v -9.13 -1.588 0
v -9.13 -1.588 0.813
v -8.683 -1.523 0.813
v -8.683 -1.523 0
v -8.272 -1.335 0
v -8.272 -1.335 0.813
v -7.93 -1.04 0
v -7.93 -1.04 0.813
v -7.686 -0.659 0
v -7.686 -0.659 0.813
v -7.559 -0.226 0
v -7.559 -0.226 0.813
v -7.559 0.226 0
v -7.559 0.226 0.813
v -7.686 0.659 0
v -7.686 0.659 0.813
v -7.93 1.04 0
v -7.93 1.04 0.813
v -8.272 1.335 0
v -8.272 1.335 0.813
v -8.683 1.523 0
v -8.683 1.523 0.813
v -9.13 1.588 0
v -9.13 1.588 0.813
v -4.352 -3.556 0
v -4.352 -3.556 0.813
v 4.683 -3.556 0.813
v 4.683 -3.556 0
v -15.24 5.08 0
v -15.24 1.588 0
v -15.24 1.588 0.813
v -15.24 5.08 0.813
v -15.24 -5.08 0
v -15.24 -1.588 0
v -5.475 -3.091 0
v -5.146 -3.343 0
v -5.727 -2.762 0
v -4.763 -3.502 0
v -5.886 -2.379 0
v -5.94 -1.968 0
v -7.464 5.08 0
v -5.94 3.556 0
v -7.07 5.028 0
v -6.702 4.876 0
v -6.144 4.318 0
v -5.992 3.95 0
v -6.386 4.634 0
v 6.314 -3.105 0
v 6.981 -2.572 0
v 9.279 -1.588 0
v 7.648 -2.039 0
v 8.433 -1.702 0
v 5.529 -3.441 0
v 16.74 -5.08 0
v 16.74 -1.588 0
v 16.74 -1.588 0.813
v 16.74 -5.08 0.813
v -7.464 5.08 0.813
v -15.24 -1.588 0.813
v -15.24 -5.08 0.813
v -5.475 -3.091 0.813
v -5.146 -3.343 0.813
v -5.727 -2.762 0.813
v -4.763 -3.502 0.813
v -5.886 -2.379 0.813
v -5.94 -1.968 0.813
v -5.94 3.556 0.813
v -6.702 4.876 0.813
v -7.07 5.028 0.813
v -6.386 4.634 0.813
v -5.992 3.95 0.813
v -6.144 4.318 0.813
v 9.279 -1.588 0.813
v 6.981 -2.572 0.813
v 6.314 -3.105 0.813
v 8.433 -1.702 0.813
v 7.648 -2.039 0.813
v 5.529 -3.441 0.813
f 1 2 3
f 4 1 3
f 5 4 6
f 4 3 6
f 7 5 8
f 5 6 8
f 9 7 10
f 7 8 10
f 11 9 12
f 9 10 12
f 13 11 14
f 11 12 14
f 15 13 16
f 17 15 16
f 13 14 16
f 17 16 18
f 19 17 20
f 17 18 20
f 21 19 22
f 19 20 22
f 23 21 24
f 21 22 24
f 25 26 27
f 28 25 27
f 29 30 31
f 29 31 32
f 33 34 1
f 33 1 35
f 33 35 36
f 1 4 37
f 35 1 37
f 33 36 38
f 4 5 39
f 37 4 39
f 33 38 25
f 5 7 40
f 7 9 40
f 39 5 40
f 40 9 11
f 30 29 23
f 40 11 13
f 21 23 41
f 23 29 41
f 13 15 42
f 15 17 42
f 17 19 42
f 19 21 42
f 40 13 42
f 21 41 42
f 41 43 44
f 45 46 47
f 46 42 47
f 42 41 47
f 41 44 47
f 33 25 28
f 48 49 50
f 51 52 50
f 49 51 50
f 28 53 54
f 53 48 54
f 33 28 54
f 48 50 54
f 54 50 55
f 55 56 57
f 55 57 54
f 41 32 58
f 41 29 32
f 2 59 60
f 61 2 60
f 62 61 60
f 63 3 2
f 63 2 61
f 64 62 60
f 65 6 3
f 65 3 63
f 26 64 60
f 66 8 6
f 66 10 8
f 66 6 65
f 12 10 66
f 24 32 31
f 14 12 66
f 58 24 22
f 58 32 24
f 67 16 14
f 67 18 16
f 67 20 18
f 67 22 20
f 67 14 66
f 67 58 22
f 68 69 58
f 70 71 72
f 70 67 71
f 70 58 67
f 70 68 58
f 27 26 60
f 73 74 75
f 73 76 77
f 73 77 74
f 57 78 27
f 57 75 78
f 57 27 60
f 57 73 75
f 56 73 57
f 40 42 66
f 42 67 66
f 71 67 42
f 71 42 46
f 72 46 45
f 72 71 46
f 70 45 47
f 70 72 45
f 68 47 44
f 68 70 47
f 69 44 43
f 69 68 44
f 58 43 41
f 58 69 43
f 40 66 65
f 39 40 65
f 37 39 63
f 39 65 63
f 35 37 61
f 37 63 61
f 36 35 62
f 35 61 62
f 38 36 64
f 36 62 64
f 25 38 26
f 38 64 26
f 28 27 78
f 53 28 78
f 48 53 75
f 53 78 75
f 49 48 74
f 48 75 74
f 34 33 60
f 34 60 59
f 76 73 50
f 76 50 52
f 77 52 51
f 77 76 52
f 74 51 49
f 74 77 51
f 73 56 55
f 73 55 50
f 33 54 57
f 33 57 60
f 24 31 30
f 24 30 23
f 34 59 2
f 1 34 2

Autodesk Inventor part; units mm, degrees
ref_plane "YZ Plane" through (0, 0, 0) normal (1, 0, 0) x (0, 1, 0)
ref_plane "XZ Plane" through (0, 0, 0) normal (0, 1, 0) x (-1, 0, 0)
ref_plane "XY Plane" through (0, 0, 0) normal (0, 0, 1) x (1, 0, 0)
sketch "Sketch1" plane through (0, 0, 0) normal (0, 0, 1) x (1, 0, 0)
  line L0 (-15.24, 5.08) -> (15.24, 5.08)
  line L1 (15.24, 5.08) -> (15.24, -5.08)
  line L2 (15.24, -5.08) -> (-15.24, -5.08)
  line L3 (-15.24, -5.08) -> (-15.24, 5.08)
  point P0 (0, 0)
  point P1 (0, 5.08)
  point P2 (-15.24, 0)
  dimension "d0" = 30.48
  dimension "d1" = 10.16
extrude "Extrusion1" add sketch "Sketch1" along normal blind 0.8128
sketch "Sketch2" plane through (0, 0, 0.8128) normal (0, 0, 1) x (1, 0, 0)
  line L0 (15.24, 5.08) -> (15.24, -5.08) projected
  line L1 (-15.24, 5.08) -> (15.24, 5.08) projected
  line L2 (-15.24, -5.08) -> (-15.24, 5.08) projected
  line L3 (15.24, -5.08) -> (-15.24, -5.08) projected
  line L4 (-4.3525, 3.556) -> (2.3785, 3.556)
  line L5 (-4.3525, -3.556) -> (2.3785, -3.556)
  line L6 (-5.94, 1.9685) -> (-5.94, -1.9685)
  line L7 (3.966, 1.9685) -> (3.966, -1.9685)
  arc A0 (-4.3525, 3.556) -> (-5.94, 1.9685) centre (-4.3525, 1.9685) ccw
  arc A1 (-5.94, -1.9685) -> (-4.3525, -3.556) centre (-4.3525, -1.9685) ccw
  arc A2 (2.3785, -3.556) -> (3.966, -1.9685) centre (2.3785, -1.9685) ccw
  arc A3 (3.966, 1.9685) -> (2.3785, 3.556) centre (2.3785, 1.9685) ccw
  point P0 (-0.987, 3.556)
  point P1 (-0.987, -3.556)
  point P2 (-5.94, 0)
  point P3 (3.966, 0)
  dimension "d5" = 6.731
  dimension "d6" = 6.731
  dimension "d7" = 3.937
  dimension "d8" = 3.937
  dimension "d13" = 1.5875
  dimension "d14" = 1.5875
  dimension "d15" = 1.5875
  dimension "d16" = 1.5875
  dimension "d38" = 9.3
extrude "Extrusion2" cut sketch "Sketch2" against normal blind 25.4 contours L4 A3 L7 A2 L5 A1 L6 A0
sketch "Sketch3" plane through (0, 0, 0.8128) normal (0, 0, 1) x (1, 0, 0)
  arc A0 (-4.3525, 3.556) -> (-5.94, 1.9685) centre (-4.3525, 1.9685) ccw projected
  line L0 (-4.3525, 3.556) -> (2.3785, 3.556) projected
  arc A1 (3.966, 1.9685) -> (2.3785, 3.556) centre (2.3785, 1.9685) ccw projected
  line L1 (3.966, 1.9685) -> (3.966, -1.9685) projected
  arc A2 (2.3785, -3.556) -> (3.966, -1.9685) centre (2.3785, -1.9685) ccw projected
  line L2 (2.3785, -3.556) -> (-4.3525, -3.556) projected
  arc A3 (-5.94, -1.9685) -> (-4.3525, -3.556) centre (-4.3525, -1.9685) ccw projected
  line L3 (-5.94, -1.9685) -> (-5.94, 1.9685) projected
  line L4 (15.24, 5.08) -> (15.24, -5.08) projected
  line L5 (-15.24, 5.08) -> (15.24, 5.08) projected
  line L6 (-15.24, -5.08) -> (-15.24, 5.08) projected
  line L7 (15.24, -5.08) -> (-15.24, -5.08) projected
  line L8 (-15.24, 1.5875) -> (-9.13, 1.5875)
  line L9 (-15.24, -1.5875) -> (-9.13, -1.5875)
  arc A4 (-9.13, -1.5875) -> (-9.13, 1.5875) centre (-9.13, 0) ccw
  point P0 (0, 0)
  dimension "d20" = 3.4925
  dimension "d21" = 6.11
  dimension "d22" = 3.175
  dimension "d24" = 1.5875
extrude "Extrusion3" cut sketch "Sketch3" against normal blind 25.4 contours L8 A4 L9 L6
mirror "Mirror1" about plane through (0, 0, 0) normal (1, 0, 0) of "Extrusion3"
sketch "Sketch5" plane through (0, 0, 0.8128) normal (0, 0, 1) x (1, 0, 0)
  line L0 (3.966, 1.9685) -> (3.966, -1.9685) construction
  line L1 (-5.94, -1.9685) -> (3.966, -1.9685)
  line L2 (3.966, -1.9685) -> (3.966, 7.0011)
  line L3 (3.966, 7.0011) -> (-5.94, 7.0011)
  line L4 (-5.94, 7.0011) -> (-5.94, -1.9685)
  point P0 (0, 0)
extrude "Extrusion5" cut sketch "Sketch5" against normal through all
fillet "Fillet1" radius 1.524 2 edges at (-5.94, 5.08, 0.4064) (3.966, 5.08, 0.4064)
sketch "Sketch7" plane through (0, 0, 0.8128) normal (0, 0, 1) x (1, 0, 0)
  line L0 (9.13, -1.5875) -> (15.24, -1.5875) construction
  line L1 (15.24, -1.5875) -> (3.966, -1.5875)
  line L2 (3.966, -1.5875) -> (3.966, 5.08)
  line L3 (3.966, 5.08) -> (15.24, 5.08)
  line L4 (15.24, 5.08) -> (15.24, -1.5875)
  line L5 (3.966, 3.556) -> (3.966, -1.9685) projected
  point P0 (0, 0)
extrude "Extrusion6" cut sketch "Sketch7" against normal through all
sketch "Sketch8" plane through (0, 0, 0.8128) normal (0, 0, 1) x (1, 0, 0)
  line L0 (3.966, -1.5875) -> (15.24, -1.5875) projected
  arc A0 (2.3785, -3.556) -> (3.966, -1.9685) centre (2.3785, -1.9685) ccw projected
  line L1 (7.62, -1.5875) -> (2.3785, -1.5875)
  line L2 (2.3785, -1.5875) -> (2.3785, -3.556)
  line L3 (2.3785, -3.556) -> (7.62, -3.556)
  line L4 (7.62, -3.556) -> (7.62, -1.5875)
  line L5 (15.24, -1.5875) -> (15.24, -5.08) projected
  point P0 (0, 0)
  dimension "d34" = 7.62
extrude "Extrusion7" cut sketch "Sketch8" against normal through all
fillet "Fillet2" radius 3.175 2 edges at (7.62, -3.556, 0.4064) (7.62, -1.5875, 0.4064)
sketch "Sketch9" plane through (15.24, -5.08, 0.8128) normal (1, 0, 0) x (0, 0, -1)
  line L0 (0.8128, 3.4925) -> (0, 3.4925) projected
  line L1 (0, 3.4925) -> (0, 0) projected
  line L2 (0.8128, 0) -> (0, 0) projected
  line L3 (0.8128, 3.4925) -> (0.8128, 0) projected
  point P0 (0.8128, 5.08)
extrude "Extrusion8" add sketch "Sketch9" along normal blind 1.5
properties part number "HarveyHeadplate_LargerCenter_FrontAndSideCutout_WiderTeeth_Ver3"
